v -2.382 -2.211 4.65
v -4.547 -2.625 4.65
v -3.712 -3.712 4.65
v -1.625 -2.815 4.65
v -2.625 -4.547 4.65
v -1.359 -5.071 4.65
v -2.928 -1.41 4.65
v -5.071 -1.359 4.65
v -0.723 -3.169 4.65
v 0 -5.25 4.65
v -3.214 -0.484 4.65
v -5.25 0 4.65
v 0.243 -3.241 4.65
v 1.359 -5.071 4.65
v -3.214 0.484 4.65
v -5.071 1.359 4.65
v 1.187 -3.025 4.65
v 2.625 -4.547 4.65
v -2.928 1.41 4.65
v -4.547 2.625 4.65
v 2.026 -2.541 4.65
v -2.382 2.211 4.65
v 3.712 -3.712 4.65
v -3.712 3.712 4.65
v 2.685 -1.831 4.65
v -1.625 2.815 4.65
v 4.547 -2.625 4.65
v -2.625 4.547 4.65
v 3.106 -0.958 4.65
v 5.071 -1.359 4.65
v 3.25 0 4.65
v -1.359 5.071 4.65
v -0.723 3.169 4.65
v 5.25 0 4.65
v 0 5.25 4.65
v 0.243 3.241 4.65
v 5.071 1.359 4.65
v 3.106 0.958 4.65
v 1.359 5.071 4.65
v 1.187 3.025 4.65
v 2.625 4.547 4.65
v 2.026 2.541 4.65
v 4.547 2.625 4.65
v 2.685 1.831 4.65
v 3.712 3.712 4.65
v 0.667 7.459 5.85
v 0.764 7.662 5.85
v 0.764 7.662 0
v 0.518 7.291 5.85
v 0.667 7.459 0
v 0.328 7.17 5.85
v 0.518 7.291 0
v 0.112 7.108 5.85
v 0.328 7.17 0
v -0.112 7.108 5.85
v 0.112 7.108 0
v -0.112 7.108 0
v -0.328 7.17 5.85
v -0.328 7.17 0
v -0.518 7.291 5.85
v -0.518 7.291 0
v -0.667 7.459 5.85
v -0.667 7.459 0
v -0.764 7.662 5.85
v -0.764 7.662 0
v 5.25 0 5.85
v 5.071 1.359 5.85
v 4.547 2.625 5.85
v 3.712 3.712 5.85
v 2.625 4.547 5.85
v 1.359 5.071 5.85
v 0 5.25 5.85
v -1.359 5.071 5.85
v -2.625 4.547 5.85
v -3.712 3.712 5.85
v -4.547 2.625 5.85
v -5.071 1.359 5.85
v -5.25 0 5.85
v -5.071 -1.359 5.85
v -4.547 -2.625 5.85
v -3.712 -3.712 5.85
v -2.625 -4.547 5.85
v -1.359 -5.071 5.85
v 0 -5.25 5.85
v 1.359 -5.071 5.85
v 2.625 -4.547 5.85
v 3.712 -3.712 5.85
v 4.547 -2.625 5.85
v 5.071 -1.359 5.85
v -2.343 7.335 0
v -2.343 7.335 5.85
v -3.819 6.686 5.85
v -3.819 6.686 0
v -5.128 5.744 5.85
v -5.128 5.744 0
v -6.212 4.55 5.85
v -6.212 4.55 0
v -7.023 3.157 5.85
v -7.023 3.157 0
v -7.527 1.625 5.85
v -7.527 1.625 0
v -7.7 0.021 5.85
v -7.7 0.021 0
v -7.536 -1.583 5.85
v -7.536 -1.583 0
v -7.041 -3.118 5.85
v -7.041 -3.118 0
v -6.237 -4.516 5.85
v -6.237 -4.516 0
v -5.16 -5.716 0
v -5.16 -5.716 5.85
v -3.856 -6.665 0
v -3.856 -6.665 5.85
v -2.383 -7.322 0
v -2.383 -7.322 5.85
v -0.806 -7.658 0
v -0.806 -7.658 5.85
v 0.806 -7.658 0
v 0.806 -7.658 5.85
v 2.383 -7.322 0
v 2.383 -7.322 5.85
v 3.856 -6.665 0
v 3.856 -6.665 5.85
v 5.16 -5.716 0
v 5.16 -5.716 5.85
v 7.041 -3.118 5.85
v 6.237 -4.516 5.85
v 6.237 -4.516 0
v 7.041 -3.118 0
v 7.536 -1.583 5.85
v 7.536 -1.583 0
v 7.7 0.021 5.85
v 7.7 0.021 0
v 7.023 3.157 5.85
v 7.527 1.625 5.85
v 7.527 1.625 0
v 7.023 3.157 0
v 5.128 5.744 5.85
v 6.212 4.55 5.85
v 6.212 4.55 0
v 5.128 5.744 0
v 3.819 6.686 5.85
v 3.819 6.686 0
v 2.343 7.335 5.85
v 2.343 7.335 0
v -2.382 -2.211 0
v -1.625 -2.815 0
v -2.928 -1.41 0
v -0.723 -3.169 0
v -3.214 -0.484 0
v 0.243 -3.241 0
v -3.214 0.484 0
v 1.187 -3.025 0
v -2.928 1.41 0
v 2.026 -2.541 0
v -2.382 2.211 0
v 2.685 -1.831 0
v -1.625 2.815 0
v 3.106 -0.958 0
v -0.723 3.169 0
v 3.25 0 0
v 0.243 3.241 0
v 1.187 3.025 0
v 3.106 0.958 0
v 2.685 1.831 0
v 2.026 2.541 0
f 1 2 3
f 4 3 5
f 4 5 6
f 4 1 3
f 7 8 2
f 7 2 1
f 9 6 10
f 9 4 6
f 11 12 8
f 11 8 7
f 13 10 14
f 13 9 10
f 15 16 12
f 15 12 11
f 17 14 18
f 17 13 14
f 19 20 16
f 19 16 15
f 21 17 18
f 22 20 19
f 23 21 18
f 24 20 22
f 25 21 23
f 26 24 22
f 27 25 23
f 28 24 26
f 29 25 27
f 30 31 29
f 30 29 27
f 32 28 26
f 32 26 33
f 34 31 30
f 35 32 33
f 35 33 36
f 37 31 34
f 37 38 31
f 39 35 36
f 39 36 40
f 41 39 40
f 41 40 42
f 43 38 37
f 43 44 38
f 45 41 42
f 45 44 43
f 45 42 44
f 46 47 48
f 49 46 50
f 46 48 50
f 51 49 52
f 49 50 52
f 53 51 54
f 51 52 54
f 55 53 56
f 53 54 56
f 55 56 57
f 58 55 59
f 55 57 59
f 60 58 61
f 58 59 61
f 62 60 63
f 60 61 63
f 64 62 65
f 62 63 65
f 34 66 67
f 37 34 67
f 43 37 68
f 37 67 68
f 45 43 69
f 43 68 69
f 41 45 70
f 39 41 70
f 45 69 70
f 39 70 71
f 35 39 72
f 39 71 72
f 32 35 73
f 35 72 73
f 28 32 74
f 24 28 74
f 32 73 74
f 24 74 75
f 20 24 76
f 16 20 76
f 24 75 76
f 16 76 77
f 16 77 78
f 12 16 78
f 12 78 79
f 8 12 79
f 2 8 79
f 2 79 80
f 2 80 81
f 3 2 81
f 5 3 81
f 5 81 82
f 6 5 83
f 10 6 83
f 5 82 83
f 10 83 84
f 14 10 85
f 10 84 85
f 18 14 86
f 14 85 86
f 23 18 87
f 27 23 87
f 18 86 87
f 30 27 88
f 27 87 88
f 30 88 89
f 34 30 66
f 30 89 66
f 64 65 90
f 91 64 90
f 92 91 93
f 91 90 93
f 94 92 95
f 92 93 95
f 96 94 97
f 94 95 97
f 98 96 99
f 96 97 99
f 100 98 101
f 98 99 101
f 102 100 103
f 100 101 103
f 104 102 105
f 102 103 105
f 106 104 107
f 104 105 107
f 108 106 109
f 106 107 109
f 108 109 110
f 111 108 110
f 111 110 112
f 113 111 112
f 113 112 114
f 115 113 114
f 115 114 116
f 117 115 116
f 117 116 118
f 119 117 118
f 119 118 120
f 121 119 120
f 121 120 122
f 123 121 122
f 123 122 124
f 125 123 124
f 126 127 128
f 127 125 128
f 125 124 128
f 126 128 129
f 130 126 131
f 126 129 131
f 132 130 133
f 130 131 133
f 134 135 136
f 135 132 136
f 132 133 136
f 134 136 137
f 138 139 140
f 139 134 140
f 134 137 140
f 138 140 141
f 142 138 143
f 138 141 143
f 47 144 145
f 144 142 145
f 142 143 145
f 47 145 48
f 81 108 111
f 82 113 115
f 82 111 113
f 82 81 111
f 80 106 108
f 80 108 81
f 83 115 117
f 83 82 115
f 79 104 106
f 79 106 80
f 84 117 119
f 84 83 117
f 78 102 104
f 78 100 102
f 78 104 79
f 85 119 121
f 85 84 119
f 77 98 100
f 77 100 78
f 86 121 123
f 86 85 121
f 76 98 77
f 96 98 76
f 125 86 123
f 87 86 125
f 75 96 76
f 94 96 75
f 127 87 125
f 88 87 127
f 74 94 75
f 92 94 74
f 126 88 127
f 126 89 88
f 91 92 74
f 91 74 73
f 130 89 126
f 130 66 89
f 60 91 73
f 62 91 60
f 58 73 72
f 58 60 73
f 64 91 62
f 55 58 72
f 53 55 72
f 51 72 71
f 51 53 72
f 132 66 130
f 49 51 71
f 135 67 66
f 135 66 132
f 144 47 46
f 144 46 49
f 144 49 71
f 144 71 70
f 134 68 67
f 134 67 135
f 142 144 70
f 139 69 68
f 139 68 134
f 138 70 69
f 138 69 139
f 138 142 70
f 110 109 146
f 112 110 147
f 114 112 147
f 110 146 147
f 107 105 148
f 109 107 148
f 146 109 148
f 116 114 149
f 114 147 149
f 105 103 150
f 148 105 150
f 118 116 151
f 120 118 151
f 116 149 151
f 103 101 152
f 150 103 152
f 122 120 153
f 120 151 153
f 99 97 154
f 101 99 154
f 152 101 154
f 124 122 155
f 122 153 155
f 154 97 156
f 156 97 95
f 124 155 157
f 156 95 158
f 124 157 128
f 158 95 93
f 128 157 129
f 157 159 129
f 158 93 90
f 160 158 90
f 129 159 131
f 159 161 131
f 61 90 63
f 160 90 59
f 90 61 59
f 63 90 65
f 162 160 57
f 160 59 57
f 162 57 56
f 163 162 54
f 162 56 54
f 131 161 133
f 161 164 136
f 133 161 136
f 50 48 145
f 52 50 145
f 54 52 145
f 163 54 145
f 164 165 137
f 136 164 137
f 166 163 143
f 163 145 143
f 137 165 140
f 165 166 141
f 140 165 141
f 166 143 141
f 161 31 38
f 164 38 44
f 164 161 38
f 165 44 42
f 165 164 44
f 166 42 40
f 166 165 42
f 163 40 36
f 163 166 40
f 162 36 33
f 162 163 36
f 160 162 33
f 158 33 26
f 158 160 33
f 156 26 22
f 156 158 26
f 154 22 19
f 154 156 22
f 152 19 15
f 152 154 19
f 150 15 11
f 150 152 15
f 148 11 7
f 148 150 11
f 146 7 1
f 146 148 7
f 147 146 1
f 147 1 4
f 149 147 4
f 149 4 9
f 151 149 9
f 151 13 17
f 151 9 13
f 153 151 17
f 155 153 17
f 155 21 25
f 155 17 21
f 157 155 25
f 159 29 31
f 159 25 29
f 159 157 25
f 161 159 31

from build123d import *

# Parameters (mm, degrees)
SKETCH1_R           = 7.7
SKETCH1_R_2         = 3.25
BOSS_EXTRUDE1_DEPTH = 5.85
SKETCH2_R           = 5.25
CUT_EXTRUDE1_DEPTH  = 1.2
SKETCH3_R           = 0.8
CUT_EXTRUDE2_DEPTH  = 10


with BuildPart() as part:
    # Sketch1 → Boss-Extrude1 (new body)
    with BuildSketch(Plane.XY):
        Circle(SKETCH1_R)
        Circle(SKETCH1_R_2, mode=Mode.SUBTRACT)
    extrude(amount=BOSS_EXTRUDE1_DEPTH)

    # Sketch2 → Cut-Extrude1 (cut)
    with BuildSketch(Plane.XY.offset(5.85)):
        Circle(SKETCH2_R)
    extrude(amount=-CUT_EXTRUDE1_DEPTH, mode=Mode.SUBTRACT)

    # Sketch3 → Cut-Extrude2 (cut)
    with BuildSketch(Plane(origin=(0, 0, 0), x_dir=(-1, 0, 0), z_dir=(0, 0, -1))):
        with Locations((0, 7.9)):
            Circle(SKETCH3_R)
    extrude(amount=-CUT_EXTRUDE2_DEPTH, mode=Mode.SUBTRACT)


solid = part.part
